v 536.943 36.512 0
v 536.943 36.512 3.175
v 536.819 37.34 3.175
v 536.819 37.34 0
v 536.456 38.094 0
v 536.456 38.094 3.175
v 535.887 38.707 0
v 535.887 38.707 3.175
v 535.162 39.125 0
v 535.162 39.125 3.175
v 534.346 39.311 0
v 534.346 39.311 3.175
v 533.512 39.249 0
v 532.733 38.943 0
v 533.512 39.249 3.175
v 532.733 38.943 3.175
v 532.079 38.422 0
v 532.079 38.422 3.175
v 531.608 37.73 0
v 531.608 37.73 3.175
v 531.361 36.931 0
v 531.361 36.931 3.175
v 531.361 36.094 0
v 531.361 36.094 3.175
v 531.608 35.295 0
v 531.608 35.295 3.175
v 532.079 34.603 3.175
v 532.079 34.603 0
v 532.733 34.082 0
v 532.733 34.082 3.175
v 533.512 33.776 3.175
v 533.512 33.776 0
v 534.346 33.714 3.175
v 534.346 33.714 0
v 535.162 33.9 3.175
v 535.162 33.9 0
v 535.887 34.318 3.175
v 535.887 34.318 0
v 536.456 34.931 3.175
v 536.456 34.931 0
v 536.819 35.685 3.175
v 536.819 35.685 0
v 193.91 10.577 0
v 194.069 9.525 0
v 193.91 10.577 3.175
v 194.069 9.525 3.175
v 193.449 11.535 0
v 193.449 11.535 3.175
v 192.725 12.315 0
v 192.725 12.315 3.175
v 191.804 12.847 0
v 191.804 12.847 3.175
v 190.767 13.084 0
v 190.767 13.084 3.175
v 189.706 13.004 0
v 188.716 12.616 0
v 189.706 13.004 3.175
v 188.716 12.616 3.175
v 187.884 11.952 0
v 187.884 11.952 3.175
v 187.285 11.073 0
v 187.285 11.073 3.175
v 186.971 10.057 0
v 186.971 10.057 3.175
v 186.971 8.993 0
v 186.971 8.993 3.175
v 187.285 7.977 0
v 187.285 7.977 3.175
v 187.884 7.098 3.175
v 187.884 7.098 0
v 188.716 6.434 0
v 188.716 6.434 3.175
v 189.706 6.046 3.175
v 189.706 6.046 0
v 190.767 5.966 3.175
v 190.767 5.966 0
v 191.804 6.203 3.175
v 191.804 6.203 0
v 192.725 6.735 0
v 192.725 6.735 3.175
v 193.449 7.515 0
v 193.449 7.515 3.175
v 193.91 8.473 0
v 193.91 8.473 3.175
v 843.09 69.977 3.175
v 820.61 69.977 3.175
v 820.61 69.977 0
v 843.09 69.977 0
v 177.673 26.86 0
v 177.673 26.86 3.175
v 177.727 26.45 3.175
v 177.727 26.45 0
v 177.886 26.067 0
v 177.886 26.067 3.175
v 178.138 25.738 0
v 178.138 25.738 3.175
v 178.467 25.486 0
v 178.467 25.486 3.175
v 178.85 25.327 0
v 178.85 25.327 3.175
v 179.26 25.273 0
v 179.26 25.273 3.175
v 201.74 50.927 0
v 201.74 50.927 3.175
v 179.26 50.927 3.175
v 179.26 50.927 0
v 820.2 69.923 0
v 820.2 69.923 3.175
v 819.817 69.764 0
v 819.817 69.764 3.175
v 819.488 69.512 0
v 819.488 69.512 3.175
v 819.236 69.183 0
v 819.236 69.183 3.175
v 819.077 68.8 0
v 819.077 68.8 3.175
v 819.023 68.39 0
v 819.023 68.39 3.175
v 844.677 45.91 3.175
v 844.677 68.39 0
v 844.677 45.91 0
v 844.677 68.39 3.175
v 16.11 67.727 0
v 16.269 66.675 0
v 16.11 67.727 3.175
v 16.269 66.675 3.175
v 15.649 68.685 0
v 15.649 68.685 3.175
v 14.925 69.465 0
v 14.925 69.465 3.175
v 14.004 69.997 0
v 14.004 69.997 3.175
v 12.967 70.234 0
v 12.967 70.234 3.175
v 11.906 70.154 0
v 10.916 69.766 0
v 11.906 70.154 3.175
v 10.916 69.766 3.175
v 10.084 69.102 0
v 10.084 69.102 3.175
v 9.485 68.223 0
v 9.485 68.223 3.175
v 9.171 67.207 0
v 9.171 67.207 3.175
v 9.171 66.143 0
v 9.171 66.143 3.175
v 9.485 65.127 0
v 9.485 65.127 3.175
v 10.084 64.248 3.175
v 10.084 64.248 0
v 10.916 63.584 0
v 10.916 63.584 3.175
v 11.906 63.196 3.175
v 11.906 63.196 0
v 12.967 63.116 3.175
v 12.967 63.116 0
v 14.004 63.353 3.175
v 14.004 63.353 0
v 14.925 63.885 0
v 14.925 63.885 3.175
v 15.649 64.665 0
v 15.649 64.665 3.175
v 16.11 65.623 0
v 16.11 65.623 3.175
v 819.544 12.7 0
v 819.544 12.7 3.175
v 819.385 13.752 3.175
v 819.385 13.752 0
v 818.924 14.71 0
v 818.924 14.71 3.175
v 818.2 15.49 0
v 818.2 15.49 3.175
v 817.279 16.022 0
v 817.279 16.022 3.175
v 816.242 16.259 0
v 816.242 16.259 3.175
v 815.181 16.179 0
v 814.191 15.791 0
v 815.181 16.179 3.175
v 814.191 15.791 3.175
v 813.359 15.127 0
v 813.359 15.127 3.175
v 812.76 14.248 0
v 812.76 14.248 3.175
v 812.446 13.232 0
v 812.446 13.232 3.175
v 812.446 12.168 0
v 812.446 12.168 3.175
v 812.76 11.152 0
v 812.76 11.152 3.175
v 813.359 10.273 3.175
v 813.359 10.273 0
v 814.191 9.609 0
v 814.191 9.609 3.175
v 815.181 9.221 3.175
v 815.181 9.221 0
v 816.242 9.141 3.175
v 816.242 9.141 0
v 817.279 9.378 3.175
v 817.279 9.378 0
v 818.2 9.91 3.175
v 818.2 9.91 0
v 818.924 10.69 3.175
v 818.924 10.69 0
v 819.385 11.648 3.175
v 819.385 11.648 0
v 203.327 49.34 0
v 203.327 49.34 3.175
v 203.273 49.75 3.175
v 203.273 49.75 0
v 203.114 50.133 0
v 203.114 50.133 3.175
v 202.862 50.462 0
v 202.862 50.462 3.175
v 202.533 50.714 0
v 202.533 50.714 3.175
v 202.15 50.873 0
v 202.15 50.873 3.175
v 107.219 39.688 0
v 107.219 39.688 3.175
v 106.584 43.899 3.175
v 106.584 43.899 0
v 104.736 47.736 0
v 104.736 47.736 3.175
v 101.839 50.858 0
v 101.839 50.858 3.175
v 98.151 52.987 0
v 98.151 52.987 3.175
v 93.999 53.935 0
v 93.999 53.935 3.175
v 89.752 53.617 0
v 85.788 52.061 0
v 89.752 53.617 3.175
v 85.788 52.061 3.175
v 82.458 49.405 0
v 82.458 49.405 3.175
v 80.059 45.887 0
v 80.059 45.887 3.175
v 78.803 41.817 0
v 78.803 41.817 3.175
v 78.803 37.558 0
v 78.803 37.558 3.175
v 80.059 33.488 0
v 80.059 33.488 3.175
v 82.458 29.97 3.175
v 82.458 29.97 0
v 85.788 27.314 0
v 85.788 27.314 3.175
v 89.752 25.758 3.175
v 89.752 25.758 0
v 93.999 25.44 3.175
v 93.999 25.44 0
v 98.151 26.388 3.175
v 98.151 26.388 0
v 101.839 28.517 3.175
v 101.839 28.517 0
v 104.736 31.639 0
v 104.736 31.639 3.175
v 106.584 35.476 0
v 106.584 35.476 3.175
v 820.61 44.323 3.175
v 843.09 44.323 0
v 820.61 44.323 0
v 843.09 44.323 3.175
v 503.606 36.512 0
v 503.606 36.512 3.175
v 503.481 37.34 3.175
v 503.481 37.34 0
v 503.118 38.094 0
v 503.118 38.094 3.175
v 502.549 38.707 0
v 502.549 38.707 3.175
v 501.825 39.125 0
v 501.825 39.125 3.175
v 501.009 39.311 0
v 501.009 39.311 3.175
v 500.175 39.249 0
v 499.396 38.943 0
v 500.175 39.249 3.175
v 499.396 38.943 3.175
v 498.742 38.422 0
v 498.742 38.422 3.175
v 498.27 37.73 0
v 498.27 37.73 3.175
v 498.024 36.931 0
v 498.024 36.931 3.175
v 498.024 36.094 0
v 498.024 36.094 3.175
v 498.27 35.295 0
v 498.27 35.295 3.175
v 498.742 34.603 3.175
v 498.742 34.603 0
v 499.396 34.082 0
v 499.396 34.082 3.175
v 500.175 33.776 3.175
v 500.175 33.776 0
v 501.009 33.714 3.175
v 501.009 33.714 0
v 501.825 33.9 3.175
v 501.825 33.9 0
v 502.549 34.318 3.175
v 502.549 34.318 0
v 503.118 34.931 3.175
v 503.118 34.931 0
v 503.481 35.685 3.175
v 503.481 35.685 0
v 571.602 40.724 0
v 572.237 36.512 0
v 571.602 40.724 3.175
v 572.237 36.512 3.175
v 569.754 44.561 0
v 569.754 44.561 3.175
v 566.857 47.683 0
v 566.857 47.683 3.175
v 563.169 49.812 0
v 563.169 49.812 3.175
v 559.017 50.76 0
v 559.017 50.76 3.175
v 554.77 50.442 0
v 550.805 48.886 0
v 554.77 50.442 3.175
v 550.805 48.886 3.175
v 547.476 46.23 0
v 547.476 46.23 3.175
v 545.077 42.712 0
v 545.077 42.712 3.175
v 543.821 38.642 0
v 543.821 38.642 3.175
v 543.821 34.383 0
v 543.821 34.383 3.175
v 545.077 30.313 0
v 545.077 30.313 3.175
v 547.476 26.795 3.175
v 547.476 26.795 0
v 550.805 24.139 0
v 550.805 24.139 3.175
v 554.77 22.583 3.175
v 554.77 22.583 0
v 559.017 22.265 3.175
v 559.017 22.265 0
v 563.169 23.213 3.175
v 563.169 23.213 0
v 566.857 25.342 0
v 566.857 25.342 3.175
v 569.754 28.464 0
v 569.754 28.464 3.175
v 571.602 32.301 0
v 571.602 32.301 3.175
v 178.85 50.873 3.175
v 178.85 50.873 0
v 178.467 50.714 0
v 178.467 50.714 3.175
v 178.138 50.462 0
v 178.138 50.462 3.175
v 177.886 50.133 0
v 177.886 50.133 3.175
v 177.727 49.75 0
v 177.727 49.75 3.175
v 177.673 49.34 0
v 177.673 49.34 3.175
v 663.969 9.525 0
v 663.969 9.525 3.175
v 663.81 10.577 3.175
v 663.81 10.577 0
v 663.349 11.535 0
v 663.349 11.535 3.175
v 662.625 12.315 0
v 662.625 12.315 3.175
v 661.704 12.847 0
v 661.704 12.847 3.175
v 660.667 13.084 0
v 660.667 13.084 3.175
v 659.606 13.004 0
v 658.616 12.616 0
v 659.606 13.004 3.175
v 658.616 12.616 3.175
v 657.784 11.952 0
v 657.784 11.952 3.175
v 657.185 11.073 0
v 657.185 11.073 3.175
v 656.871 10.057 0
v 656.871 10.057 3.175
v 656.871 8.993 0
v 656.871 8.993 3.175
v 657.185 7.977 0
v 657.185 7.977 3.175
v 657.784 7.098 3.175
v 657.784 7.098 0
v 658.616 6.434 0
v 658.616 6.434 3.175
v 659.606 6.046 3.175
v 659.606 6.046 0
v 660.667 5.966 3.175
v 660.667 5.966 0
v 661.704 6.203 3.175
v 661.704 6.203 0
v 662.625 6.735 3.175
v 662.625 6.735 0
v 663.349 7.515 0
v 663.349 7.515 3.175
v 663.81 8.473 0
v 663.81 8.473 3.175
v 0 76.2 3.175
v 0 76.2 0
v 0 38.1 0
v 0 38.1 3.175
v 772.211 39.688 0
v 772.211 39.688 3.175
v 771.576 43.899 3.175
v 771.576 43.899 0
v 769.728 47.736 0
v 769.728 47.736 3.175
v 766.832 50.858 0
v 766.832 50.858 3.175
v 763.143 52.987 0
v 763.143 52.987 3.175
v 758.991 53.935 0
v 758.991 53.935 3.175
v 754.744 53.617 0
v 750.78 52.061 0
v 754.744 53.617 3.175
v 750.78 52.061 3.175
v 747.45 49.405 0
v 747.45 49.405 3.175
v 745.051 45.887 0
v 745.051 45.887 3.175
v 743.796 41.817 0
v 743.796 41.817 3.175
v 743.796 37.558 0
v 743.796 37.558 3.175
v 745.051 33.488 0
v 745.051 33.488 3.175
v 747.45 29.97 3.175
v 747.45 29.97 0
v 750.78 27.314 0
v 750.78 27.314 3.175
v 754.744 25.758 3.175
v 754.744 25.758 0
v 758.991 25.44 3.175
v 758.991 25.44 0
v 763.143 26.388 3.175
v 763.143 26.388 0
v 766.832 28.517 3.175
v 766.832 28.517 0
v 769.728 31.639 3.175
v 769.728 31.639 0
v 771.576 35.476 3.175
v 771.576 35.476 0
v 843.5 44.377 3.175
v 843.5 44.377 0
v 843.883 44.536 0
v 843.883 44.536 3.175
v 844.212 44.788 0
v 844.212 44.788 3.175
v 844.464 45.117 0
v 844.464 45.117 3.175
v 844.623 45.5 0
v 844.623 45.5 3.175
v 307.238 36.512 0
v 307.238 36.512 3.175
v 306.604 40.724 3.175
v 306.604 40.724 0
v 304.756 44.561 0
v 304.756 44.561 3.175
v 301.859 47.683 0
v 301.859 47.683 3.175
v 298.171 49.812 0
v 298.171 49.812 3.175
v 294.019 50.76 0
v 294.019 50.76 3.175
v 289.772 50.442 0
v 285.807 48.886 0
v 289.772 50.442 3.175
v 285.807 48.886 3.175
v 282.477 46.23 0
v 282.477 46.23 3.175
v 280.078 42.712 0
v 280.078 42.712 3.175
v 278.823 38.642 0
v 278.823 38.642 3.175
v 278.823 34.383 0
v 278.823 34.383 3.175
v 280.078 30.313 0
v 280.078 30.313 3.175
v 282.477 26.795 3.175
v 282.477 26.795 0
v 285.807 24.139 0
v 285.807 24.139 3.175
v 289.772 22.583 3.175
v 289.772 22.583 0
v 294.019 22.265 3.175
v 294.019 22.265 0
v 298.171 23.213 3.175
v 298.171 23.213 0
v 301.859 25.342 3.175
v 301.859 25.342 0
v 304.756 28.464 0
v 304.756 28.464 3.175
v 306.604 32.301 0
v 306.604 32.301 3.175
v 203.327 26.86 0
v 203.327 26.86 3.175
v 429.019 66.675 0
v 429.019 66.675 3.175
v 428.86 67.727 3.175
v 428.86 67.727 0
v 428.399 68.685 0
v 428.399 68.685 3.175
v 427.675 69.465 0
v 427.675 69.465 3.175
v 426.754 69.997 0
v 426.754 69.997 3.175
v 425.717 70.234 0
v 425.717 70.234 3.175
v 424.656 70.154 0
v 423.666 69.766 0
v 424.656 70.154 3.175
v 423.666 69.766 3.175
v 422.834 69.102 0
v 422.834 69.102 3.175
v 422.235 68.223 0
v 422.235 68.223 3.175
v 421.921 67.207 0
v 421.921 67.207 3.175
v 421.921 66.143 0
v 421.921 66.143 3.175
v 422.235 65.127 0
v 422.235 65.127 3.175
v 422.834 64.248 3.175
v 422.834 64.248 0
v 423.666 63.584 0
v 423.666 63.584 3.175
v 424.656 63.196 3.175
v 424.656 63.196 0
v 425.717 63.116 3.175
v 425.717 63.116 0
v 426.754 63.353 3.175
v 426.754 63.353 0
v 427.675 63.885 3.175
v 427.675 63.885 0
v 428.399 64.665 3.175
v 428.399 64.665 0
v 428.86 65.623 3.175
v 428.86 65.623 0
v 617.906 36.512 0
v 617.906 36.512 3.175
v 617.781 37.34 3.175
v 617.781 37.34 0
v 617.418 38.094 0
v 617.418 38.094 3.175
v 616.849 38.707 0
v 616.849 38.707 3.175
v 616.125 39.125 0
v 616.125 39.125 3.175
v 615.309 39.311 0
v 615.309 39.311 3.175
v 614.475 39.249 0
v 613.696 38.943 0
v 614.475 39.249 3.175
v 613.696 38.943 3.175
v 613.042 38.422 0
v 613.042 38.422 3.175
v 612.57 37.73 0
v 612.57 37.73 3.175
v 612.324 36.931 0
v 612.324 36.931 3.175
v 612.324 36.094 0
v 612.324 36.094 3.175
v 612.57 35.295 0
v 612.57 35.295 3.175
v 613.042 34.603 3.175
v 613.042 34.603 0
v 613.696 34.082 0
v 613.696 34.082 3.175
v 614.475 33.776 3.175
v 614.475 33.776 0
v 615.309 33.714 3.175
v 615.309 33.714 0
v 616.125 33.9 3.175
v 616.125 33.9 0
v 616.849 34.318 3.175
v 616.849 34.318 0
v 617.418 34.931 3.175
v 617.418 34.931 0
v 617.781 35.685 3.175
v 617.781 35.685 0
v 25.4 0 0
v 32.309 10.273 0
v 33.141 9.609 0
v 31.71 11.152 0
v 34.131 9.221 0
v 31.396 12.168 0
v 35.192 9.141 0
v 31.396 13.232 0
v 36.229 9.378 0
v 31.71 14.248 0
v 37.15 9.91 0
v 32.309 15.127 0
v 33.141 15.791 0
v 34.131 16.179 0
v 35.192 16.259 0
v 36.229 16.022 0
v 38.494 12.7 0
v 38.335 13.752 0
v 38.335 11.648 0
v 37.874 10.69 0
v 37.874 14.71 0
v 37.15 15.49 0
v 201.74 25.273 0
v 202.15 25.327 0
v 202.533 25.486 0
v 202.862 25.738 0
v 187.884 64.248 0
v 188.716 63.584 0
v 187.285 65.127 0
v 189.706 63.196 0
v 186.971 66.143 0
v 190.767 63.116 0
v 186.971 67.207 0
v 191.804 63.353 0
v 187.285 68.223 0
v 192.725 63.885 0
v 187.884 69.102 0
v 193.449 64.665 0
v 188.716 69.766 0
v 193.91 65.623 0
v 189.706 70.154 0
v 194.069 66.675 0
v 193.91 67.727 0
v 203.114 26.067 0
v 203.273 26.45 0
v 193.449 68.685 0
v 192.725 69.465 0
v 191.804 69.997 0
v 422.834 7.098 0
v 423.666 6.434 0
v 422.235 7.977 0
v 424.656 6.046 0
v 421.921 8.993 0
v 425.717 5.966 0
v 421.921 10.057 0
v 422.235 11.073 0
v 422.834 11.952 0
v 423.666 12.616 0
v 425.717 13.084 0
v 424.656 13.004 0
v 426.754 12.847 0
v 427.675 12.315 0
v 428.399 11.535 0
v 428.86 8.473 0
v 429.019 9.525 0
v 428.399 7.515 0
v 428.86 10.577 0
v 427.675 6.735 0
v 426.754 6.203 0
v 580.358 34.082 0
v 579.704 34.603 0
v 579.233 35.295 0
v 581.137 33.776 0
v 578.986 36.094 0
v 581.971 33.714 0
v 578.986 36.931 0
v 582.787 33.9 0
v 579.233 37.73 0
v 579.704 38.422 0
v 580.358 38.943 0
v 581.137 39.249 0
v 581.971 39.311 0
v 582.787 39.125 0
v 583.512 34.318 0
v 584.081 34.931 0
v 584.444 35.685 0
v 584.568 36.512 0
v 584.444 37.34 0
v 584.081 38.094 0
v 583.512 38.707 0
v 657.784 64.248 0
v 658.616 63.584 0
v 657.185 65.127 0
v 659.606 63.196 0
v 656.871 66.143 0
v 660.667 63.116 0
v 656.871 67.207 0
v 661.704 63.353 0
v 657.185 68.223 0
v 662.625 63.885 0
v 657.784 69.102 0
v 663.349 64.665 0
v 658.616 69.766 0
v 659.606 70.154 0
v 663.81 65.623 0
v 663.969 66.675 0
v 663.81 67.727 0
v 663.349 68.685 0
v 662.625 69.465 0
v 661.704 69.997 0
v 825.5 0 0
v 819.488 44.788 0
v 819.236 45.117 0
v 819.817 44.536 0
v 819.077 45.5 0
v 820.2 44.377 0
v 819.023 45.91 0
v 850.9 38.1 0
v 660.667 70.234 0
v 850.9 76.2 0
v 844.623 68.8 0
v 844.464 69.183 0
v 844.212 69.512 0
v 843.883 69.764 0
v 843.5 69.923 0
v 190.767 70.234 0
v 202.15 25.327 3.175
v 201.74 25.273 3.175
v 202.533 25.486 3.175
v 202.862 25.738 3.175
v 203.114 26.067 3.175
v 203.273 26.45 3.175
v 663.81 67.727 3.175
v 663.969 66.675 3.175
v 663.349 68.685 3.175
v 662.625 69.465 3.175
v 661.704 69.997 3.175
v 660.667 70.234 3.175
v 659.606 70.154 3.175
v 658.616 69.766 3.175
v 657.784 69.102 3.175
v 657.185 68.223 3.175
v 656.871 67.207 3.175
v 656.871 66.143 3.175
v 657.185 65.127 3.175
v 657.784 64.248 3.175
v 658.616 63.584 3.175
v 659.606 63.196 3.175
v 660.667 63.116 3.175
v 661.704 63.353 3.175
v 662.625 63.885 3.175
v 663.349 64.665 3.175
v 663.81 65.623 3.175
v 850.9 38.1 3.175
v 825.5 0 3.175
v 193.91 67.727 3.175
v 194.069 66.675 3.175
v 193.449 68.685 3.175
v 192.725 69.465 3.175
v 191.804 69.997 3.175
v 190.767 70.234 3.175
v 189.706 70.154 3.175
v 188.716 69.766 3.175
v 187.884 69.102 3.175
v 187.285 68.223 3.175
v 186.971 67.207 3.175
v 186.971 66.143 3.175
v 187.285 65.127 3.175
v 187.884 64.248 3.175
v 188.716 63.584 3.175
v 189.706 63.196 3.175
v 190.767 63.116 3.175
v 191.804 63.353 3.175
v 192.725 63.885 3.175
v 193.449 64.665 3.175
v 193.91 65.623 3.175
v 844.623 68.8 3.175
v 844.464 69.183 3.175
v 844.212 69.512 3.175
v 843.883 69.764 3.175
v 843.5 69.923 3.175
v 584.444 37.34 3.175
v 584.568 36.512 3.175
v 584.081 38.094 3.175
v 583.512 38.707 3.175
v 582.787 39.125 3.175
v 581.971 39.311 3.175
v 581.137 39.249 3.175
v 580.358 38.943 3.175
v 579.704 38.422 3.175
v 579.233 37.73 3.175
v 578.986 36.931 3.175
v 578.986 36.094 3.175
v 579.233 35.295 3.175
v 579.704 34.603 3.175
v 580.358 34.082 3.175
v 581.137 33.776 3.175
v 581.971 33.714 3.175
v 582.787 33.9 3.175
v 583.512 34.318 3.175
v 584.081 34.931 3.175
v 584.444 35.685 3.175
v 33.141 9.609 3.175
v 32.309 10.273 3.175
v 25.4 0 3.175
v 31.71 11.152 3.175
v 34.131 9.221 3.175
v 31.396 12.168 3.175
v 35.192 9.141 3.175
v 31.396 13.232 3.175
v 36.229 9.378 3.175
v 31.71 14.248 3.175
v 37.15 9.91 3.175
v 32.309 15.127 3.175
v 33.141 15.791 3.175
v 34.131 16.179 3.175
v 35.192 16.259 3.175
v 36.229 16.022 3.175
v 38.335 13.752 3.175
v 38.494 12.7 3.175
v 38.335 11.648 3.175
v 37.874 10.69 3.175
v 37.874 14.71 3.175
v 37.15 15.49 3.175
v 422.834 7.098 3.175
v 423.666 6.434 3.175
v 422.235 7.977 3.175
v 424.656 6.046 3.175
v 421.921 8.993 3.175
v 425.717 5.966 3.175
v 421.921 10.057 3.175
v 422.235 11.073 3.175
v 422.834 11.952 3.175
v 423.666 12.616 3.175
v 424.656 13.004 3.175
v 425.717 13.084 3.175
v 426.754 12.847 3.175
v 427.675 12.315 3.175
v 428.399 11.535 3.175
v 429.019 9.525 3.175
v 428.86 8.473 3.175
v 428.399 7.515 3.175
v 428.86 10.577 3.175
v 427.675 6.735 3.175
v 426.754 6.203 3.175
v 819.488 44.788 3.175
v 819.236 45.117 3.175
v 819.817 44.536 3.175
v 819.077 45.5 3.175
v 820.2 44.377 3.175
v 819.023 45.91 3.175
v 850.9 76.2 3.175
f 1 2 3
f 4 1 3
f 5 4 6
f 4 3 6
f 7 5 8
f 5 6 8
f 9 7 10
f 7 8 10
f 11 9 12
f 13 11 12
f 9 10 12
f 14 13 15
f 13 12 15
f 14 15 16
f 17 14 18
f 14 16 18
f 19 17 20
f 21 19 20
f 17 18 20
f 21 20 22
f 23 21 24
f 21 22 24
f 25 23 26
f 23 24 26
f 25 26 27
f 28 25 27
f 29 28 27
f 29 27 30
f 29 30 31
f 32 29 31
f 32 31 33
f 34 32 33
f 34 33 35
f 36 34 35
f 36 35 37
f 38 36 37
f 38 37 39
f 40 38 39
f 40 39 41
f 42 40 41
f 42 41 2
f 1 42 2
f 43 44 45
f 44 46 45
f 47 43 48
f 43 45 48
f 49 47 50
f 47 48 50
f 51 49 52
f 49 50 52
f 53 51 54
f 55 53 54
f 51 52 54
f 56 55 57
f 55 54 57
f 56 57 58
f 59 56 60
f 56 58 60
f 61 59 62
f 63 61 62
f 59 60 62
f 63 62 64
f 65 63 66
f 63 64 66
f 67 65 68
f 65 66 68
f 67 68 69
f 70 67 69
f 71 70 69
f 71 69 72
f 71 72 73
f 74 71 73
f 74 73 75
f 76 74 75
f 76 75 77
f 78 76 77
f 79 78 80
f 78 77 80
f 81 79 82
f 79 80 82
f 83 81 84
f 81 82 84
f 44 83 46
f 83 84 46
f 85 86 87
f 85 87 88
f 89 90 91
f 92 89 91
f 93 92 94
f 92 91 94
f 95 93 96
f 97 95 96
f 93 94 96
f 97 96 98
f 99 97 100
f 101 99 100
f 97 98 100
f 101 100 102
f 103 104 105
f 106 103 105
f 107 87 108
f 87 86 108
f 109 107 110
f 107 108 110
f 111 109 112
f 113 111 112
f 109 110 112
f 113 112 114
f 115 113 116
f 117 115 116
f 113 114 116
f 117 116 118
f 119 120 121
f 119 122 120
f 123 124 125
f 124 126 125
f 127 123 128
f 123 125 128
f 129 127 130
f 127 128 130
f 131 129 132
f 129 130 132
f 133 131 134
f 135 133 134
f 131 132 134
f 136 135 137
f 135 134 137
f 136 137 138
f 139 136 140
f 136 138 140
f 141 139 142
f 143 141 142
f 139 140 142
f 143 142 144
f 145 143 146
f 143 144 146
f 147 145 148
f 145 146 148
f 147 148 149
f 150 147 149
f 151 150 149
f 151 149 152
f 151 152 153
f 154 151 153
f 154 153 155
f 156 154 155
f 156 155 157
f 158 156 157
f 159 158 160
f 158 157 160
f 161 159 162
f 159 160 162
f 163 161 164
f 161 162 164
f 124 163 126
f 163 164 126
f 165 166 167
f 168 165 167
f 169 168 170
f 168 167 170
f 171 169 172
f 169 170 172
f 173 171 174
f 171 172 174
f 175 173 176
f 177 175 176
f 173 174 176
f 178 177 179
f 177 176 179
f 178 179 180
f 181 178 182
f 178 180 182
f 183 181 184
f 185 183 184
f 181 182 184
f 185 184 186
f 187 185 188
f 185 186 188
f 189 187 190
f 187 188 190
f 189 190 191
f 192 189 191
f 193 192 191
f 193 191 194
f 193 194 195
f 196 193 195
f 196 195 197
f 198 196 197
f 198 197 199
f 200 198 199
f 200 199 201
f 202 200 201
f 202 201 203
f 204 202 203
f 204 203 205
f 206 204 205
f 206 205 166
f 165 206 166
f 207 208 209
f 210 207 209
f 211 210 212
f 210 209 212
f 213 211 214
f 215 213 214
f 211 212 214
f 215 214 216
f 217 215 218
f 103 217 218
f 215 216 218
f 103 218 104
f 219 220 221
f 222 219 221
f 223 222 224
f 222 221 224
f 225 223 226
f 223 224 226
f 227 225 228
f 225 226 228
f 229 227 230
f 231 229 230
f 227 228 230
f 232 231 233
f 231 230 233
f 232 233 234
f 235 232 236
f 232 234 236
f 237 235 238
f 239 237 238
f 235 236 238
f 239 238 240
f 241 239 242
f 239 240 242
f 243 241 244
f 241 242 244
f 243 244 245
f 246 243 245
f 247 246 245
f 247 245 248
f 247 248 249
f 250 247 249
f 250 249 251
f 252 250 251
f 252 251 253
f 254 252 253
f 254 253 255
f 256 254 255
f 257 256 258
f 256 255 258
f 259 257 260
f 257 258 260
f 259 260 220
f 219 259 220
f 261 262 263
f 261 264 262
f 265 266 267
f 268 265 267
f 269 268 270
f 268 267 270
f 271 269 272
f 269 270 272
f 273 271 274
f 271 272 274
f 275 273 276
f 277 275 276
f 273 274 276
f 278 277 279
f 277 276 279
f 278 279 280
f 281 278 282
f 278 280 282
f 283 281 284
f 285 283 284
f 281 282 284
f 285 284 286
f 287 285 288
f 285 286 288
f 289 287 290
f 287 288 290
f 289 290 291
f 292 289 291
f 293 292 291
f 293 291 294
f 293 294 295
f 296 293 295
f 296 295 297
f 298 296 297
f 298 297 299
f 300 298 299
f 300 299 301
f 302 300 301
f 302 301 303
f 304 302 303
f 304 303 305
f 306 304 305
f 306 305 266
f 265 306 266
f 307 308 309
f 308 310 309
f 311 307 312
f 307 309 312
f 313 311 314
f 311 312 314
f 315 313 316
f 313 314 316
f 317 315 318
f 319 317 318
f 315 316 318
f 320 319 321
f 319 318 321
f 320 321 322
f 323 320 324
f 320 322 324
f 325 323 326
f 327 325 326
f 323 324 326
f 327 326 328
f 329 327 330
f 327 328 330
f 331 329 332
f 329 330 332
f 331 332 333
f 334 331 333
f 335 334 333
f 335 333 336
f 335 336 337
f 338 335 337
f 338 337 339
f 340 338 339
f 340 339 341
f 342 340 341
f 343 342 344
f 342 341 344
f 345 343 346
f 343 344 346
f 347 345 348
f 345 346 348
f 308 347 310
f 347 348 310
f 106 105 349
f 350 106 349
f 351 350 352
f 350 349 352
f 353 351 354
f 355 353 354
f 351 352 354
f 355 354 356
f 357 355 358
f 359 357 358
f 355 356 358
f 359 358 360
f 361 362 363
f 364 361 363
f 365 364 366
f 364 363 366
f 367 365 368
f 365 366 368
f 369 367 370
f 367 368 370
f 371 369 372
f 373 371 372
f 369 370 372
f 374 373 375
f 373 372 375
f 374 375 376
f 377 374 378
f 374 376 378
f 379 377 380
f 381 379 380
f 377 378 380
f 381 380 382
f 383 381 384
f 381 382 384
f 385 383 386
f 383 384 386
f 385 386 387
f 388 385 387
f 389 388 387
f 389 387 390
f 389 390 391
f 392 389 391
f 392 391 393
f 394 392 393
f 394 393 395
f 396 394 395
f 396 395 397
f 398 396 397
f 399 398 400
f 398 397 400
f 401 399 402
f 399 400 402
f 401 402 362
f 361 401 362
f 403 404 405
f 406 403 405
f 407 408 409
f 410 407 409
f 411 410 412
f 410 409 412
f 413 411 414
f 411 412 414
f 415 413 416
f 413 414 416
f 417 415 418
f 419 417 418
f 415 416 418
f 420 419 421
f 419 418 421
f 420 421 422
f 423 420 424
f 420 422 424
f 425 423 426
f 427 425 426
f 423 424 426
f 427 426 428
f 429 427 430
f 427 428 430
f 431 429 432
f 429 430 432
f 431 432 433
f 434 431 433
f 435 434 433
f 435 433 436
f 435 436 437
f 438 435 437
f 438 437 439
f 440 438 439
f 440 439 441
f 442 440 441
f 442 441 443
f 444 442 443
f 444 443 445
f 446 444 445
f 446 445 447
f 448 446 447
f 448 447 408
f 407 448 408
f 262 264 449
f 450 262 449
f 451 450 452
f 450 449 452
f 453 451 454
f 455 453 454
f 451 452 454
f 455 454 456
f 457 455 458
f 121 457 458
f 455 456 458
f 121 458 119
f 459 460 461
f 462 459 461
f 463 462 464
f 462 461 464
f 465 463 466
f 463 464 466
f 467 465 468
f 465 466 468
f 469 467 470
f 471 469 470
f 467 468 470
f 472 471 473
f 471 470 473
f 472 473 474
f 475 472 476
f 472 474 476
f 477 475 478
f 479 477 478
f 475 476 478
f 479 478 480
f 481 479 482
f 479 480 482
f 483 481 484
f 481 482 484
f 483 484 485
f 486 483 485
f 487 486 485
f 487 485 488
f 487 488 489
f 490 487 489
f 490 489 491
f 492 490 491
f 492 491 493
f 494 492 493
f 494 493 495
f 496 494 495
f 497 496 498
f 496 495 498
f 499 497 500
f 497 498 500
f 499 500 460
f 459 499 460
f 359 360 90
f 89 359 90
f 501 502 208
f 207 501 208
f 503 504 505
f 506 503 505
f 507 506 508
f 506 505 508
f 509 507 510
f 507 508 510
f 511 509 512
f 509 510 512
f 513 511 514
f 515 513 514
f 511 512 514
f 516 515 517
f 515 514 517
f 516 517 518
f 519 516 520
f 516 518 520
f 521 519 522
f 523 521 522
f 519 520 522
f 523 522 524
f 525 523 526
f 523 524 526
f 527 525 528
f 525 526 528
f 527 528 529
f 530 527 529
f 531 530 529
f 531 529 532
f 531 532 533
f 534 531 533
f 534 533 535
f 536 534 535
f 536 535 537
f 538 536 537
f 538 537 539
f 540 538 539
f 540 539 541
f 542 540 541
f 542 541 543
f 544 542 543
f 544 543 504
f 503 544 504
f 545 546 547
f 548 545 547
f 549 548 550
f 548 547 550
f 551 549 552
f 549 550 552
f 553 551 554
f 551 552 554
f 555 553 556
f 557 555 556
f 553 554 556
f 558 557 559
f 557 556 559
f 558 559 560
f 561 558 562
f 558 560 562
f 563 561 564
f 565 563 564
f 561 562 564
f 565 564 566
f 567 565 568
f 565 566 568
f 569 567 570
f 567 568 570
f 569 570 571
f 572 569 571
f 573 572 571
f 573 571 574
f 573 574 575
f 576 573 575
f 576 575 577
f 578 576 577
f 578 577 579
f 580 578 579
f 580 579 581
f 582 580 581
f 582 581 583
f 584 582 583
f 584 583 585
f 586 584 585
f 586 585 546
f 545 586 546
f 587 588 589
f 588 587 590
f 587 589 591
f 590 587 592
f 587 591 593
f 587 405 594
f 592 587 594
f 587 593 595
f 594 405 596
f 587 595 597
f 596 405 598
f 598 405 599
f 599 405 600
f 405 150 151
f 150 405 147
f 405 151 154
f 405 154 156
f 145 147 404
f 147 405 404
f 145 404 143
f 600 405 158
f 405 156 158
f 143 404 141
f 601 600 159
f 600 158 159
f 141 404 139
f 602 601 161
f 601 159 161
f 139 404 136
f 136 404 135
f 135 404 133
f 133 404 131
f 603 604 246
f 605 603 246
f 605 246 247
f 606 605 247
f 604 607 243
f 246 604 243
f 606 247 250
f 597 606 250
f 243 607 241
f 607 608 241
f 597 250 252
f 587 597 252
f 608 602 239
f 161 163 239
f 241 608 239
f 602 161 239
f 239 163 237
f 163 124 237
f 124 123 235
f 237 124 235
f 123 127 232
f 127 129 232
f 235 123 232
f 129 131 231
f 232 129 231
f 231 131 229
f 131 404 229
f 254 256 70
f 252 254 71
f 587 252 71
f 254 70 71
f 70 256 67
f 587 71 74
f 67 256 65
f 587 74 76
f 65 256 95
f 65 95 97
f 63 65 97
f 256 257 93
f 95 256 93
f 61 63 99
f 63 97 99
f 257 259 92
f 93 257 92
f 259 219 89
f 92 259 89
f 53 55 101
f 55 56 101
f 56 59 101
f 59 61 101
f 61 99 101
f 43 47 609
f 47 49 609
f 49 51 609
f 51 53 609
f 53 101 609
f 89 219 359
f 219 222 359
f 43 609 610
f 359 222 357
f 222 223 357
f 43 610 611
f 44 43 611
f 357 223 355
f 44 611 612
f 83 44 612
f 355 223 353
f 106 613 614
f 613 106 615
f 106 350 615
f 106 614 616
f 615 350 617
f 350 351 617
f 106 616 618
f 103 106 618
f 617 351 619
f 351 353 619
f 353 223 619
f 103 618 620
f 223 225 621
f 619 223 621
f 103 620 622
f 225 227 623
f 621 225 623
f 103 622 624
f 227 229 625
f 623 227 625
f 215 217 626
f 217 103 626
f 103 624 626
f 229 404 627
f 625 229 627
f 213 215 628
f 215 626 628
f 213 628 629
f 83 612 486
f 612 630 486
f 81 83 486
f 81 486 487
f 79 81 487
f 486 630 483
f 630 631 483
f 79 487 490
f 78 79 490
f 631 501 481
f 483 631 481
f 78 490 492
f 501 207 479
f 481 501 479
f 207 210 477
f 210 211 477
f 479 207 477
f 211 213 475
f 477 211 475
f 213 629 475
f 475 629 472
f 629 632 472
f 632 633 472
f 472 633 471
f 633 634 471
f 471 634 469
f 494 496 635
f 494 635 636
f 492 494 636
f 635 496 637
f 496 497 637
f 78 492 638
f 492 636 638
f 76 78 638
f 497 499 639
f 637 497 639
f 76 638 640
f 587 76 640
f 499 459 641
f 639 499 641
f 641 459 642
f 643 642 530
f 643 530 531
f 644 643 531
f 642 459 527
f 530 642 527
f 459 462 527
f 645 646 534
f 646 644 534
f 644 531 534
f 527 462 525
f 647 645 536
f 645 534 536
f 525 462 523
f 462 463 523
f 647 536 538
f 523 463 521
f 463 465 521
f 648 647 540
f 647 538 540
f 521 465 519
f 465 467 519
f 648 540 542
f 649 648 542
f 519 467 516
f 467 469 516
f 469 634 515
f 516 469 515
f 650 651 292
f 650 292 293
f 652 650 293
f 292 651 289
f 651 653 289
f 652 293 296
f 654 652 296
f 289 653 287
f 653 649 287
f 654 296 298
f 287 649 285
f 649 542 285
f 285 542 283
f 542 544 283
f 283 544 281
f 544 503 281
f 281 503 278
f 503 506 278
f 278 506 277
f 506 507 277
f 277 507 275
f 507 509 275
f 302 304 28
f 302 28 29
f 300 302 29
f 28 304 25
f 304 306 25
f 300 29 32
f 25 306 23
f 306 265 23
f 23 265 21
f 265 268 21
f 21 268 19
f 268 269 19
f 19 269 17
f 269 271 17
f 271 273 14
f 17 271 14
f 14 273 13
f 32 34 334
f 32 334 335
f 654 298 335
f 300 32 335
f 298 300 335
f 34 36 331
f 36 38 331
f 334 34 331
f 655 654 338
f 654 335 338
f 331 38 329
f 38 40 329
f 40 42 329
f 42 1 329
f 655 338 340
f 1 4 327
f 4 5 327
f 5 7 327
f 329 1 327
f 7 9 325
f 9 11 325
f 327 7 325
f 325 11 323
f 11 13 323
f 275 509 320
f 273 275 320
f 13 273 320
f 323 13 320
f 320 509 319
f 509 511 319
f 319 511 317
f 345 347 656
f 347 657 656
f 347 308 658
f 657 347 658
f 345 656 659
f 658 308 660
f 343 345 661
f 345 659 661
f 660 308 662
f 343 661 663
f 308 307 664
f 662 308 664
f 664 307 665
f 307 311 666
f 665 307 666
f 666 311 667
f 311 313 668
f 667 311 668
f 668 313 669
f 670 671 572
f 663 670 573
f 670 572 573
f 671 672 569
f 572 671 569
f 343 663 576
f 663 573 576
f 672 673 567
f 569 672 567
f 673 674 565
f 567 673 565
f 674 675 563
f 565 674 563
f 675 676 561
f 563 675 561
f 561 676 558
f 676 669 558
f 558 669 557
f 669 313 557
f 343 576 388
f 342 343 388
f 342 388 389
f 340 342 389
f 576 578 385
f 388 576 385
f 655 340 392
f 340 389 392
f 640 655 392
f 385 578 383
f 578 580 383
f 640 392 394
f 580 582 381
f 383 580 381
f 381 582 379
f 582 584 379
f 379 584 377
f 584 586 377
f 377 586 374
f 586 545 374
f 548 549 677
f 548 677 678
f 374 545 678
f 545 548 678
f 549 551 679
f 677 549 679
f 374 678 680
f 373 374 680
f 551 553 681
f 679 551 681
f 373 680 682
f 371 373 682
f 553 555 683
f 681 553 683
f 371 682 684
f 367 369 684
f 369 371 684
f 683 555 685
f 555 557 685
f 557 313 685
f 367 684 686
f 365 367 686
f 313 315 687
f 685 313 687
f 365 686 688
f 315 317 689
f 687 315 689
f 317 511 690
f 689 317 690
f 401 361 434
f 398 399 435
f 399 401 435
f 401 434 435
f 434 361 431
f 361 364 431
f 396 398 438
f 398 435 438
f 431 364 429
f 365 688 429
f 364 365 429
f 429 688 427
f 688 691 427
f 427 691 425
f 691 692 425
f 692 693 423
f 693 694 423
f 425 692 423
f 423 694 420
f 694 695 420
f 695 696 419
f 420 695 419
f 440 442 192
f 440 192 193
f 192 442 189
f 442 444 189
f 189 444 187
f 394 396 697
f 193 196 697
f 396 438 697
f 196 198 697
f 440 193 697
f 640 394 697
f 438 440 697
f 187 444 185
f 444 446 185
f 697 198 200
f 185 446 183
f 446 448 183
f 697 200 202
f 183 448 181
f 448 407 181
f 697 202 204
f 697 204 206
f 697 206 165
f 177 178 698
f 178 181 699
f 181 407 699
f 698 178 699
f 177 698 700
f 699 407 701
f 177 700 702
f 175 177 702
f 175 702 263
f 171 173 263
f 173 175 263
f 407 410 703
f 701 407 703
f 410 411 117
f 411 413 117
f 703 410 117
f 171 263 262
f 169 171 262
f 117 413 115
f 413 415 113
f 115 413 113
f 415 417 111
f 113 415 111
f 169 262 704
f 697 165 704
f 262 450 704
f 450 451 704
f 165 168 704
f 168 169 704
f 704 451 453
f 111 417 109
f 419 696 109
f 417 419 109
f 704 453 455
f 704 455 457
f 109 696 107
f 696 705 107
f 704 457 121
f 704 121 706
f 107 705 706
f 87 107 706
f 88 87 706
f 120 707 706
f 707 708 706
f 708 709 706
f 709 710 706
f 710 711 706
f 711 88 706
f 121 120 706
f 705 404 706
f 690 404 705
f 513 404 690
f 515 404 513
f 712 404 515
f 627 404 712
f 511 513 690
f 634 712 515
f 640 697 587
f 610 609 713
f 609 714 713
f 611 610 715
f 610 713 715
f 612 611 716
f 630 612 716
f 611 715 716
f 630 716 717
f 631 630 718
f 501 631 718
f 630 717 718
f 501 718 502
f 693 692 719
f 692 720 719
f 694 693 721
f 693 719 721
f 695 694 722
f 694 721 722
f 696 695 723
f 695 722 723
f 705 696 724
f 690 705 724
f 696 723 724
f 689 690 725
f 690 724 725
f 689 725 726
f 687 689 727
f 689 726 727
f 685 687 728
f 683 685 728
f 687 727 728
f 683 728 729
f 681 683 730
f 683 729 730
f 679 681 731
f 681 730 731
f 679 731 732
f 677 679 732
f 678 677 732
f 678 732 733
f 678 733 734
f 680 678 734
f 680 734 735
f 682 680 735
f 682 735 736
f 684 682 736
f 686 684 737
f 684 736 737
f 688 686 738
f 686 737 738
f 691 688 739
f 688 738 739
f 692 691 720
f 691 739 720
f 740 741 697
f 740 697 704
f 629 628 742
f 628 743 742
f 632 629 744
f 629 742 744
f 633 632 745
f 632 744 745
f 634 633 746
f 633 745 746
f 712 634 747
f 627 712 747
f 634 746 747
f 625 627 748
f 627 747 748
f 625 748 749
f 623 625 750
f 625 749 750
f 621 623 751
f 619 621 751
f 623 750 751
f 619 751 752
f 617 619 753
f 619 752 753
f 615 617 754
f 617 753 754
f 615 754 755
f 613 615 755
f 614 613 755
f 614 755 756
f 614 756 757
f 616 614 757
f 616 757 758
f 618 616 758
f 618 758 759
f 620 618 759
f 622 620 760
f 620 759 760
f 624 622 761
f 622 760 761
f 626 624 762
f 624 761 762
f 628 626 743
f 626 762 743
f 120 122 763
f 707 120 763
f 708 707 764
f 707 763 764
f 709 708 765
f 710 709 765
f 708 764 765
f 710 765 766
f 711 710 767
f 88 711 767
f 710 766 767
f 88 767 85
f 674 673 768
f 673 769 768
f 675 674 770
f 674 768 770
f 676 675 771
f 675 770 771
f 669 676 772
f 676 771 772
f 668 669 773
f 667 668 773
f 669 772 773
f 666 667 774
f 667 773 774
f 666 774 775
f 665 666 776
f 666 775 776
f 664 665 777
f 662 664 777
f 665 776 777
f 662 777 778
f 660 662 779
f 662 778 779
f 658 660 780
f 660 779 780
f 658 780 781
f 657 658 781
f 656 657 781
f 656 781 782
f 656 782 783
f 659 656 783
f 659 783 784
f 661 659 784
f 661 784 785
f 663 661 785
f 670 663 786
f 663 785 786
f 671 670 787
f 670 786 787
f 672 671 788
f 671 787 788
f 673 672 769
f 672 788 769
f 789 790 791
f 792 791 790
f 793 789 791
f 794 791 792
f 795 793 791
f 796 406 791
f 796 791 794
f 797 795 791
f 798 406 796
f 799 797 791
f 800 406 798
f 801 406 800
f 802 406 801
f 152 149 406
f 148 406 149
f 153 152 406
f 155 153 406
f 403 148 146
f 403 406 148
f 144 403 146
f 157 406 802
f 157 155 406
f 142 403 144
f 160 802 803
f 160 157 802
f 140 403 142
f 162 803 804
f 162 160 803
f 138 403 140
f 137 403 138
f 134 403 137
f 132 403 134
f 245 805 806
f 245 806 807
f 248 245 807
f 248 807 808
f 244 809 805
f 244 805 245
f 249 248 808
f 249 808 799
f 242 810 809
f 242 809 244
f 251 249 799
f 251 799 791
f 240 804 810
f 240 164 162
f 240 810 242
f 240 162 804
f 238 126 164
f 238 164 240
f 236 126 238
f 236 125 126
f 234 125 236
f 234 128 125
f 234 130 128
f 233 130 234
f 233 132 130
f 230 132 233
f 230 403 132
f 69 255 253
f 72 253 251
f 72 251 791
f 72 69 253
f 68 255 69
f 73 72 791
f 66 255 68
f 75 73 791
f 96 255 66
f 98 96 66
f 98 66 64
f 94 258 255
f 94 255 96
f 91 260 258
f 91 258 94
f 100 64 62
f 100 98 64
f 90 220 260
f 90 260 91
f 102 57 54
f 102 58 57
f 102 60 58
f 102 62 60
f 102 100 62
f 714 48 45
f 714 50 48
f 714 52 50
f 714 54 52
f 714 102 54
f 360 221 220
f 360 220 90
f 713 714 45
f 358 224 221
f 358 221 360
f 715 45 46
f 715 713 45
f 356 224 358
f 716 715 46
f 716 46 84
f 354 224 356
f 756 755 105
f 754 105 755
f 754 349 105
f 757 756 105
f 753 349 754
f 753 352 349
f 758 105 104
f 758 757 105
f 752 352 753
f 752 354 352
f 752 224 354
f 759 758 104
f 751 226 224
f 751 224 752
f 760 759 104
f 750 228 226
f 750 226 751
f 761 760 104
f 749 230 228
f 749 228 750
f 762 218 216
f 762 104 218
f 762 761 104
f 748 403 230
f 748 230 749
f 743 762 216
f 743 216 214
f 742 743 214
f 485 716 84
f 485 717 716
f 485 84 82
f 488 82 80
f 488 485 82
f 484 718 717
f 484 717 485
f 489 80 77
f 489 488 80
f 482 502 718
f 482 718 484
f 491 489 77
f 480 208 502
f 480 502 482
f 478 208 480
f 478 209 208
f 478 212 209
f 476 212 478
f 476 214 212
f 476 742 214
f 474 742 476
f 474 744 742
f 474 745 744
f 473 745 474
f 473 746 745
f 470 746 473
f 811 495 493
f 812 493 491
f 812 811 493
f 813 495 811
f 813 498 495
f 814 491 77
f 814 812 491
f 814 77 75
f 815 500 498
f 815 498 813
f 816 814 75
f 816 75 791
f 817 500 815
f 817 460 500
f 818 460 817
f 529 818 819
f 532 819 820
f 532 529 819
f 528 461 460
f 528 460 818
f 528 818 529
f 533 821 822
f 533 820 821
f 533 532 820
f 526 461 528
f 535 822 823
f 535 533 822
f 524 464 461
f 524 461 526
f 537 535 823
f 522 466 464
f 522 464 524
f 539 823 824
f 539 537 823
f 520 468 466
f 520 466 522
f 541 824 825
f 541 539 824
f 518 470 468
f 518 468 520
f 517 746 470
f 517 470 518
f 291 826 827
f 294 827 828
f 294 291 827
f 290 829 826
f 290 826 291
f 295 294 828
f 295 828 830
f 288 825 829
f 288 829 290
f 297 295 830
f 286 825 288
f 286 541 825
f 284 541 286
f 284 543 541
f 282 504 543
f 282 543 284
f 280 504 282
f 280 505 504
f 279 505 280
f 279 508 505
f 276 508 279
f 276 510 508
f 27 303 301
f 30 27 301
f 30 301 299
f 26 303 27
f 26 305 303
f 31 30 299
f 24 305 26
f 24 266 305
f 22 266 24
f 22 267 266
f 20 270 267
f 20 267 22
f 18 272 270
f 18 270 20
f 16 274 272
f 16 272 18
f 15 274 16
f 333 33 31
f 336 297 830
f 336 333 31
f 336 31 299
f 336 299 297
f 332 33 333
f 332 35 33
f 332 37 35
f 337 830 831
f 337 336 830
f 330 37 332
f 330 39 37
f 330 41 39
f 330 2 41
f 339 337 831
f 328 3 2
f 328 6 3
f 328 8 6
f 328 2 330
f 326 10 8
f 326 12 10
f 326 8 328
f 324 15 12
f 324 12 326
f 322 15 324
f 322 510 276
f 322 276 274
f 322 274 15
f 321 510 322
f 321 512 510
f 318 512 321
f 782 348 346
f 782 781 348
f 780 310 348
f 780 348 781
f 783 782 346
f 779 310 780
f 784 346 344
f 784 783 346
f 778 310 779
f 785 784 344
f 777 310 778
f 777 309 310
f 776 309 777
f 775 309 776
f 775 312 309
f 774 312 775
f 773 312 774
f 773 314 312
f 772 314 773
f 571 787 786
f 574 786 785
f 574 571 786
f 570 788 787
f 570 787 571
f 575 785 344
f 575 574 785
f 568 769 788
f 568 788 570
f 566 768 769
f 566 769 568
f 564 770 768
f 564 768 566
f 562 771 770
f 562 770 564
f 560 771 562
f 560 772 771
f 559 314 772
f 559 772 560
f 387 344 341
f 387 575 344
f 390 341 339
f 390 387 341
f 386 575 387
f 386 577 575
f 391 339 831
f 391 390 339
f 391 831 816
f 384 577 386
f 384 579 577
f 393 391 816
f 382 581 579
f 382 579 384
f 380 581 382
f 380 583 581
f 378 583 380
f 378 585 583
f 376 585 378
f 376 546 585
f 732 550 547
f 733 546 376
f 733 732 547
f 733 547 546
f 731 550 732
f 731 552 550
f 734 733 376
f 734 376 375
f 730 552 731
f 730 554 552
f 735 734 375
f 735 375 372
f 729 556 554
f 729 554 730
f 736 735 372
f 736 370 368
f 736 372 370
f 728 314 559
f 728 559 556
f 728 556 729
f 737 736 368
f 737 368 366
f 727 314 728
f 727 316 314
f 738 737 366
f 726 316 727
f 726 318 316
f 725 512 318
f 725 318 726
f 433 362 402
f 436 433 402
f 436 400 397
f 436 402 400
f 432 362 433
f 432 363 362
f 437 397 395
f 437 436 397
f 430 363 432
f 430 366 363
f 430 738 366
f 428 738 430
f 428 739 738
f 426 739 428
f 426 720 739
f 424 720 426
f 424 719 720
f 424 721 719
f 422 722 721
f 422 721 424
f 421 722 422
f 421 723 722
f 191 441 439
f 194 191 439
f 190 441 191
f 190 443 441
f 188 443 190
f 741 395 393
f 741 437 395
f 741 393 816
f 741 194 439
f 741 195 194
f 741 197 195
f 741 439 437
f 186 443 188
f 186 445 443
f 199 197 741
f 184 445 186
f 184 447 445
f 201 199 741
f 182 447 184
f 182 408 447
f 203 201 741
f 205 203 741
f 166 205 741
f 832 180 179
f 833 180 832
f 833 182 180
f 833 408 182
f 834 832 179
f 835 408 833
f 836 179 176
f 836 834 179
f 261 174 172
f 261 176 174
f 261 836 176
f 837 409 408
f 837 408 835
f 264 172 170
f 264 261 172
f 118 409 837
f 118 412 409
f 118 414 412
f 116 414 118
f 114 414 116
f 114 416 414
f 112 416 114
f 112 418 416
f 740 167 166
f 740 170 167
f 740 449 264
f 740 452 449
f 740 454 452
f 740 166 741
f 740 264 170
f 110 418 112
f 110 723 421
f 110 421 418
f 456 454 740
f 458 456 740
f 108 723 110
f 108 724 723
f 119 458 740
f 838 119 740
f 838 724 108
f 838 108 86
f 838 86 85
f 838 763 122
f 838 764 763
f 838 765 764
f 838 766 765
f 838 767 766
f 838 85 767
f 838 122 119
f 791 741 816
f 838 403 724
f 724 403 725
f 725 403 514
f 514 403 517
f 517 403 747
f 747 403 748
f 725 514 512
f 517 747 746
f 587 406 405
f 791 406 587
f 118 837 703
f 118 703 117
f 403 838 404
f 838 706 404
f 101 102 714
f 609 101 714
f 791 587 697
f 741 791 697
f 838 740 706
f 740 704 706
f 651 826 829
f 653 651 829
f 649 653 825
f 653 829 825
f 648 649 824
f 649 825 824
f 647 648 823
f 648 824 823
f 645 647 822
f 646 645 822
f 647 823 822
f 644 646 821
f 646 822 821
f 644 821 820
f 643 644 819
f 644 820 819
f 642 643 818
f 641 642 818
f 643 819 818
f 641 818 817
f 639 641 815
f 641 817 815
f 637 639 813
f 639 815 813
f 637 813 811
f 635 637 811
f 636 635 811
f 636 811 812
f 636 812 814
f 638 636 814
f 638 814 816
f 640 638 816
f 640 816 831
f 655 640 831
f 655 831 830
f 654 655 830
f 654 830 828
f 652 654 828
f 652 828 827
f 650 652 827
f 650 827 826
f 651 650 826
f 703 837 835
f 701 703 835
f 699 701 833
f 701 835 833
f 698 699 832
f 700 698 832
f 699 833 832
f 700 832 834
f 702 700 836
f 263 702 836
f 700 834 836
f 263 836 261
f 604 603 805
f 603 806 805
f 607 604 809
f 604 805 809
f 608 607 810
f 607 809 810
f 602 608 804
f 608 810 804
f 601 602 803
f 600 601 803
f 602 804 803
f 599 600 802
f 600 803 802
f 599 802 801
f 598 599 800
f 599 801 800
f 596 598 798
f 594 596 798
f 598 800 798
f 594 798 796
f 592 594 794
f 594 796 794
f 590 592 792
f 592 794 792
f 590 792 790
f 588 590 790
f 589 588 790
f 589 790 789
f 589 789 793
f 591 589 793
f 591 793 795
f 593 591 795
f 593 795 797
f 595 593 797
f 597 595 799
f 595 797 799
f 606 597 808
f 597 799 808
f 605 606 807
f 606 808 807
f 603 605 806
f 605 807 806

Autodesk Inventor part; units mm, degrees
ref_plane "YZ Plane" through (0, 0, 0) normal (1, 0, 0) x (0, 1, 0)
ref_plane "XZ Plane" through (0, 0, 0) normal (0, 1, 0) x (-1, 0, 0)
ref_plane "XY Plane" through (0, 0, 0) normal (0, 0, 1) x (1, 0, 0)
sketch "Sketch1" plane through (0, 0, 0) normal (0, 0, 1) x (1, 0, 0)
  line L0 (0, 0) -> (850.9, 0)
  line L1 (850.9, 0) -> (850.9, 76.2)
  line L2 (850.9, 76.2) -> (0, 76.2)
  line L3 (0, 76.2) -> (0, 0)
  dimension "d0" = 850.9
  dimension "d1" = 76.2
extrude "Extrusion1" add sketch "Sketch1" along normal blind 3.175
sketch "Sketch2" plane through (0, 0, 3.175) normal (0, 0, 1) x (1, 0, 0)
  line L0 (0, 0) -> (850.9, 0) projected
  circle A0 centre (292.9509, 36.5125) radius 14.2875
  circle A1 centre (557.9491, 36.5125) radius 14.2875
  circle A2 centre (92.9313, 39.6875) radius 14.2875
  circle A3 centre (757.9235, 39.6875) radius 14.2875
  line L1 (0, 0) -> (25.4, 0)
  line L2 (0, 0) -> (0, 38.1)
  line L3 (0, 76.2) -> (0, 0) projected
  line L4 (0, 38.1) -> (25.4, 0)
  circle A4 centre (34.925, 12.7) radius 3.5687
  circle A5 centre (12.7, 66.675) radius 3.5687
  line L5 (850.9, 76.2) -> (0, 76.2) projected
  line L6 (850.9, 0) -> (850.9, 38.1)
  line L7 (850.9, 0) -> (850.9, 76.2) projected
  line L8 (850.9, 0) -> (825.5, 0)
  line L9 (825.5, 0) -> (850.9, 38.1)
  circle A6 centre (190.5, 38.1) radius 3.5687
  line L10 (825.5, 0) -> (800.1, 0)
  circle A7 centre (815.975, 12.7) radius 3.5687
  circle A8 centre (831.85, 57.15) radius 3.5687
  circle A9 centre (425.45, 66.675) radius 3.5687
  circle A10 centre (425.45, 9.525) radius 3.5687
  circle A11 centre (190.5, 9.525) radius 3.5687
  circle A12 centre (190.5, 66.675) radius 3.5687
  circle A13 centre (660.4, 66.675) radius 3.5687
  circle A14 centre (660.4, 9.525) radius 3.5687
  dimension "d10" = 28.575
  dimension "d23" = 28.575
  dimension "d30" = 28.575
  dimension "d32" = 28.575
  dimension "d34" = 25.4
  dimension "d35" = 38.1
  dimension "d36" = 7.1374
  dimension "d37" = 12.7
  dimension "d38" = 9.525
  dimension "d40" = 7.1374
  dimension "d41" = 12.7
  dimension "d42" = 9.525
  dimension "d43" = 38.1
  dimension "d44" = 25.4
  dimension "d53" = 7.1374
  dimension "d54" = 38.1
  dimension "d55" = 190.5
  dimension "d59" = 7.1374
  dimension "d60" = 12.7
  dimension "d61" = 9.525
  dimension "d66" = 7.1374
  dimension "d67" = 7.1374
  dimension "d68" = 9.525
  dimension "d69" = 425.45
  dimension "d70" = 7.1374
  dimension "d71" = 9.525
  dimension "d72" = 425.45
  dimension "d73" = 7.1374
  dimension "d74" = 7.1374
  dimension "d75" = 9.525
  dimension "d76" = 9.525
  dimension "d77" = 190.5
  dimension "d78" = 190.5
  dimension "d79" = 7.1374
  dimension "d80" = 7.1374
  dimension "d81" = 9.525
  dimension "d82" = 9.525
  dimension "d83" = 190.5
  dimension "d84" = 190.5
extrude "Extrusion2" cut sketch "Sketch2" against normal blind 3.175 contours L2 L4 L0 | L9 L6 L0 | A0 | A1 | A2 | A3 | A4 | A5 | A6 | A7 | A8 | A9 | A10 | A11 | A12 | A13 | A14
sketch "Sketch3" plane through (0, 0, 3.175) normal (0, 0, 1) x (1, 0, 0)
  circle A0 centre (190.5, 38.1) radius 3.5687 projected
  circle A1 centre (831.85, 57.15) radius 3.5687 projected
  line L0 (179.2605, 25.273) -> (201.7395, 25.273)
  line L1 (203.327, 26.8605) -> (203.327, 49.3395)
  line L2 (201.7395, 50.927) -> (179.2605, 50.927)
  line L3 (177.673, 49.3395) -> (177.673, 26.8605)
  line L4 (177.673, 25.273) -> (203.327, 50.927) construction
  line L5 (203.327, 25.273) -> (177.673, 50.927) construction
  line L6 (843.0895, 44.323) -> (820.6105, 44.323)
  line L7 (819.023, 45.9105) -> (819.023, 68.3895)
  line L8 (820.6105, 69.977) -> (843.0895, 69.977)
  line L9 (844.677, 68.3895) -> (844.677, 45.9105)
  line L10 (844.677, 44.323) -> (819.023, 69.977) construction
  line L11 (819.023, 44.323) -> (844.677, 69.977) construction
  circle A2 centre (581.7616, 36.5125) radius 2.8067
  circle A3 centre (534.1366, 36.5125) radius 2.8067
  circle A4 centre (500.7991, 36.5125) radius 2.8067
  circle A5 centre (615.0991, 36.5125) radius 2.8067
  arc A6 (179.2605, 50.927) -> (177.673, 49.3395) centre (179.2605, 49.3395) ccw
  arc A7 (203.327, 49.3395) -> (201.7395, 50.927) centre (201.7395, 49.3395) ccw
  arc A8 (201.7395, 25.273) -> (203.327, 26.8605) centre (201.7395, 26.8605) ccw
  arc A9 (177.673, 26.8605) -> (179.2605, 25.273) centre (179.2605, 26.8605) ccw
  arc A10 (820.6105, 69.977) -> (819.023, 68.3895) centre (820.6105, 68.3895) ccw
  arc A11 (844.677, 68.3895) -> (843.0895, 69.977) centre (843.0895, 68.3895) ccw
  arc A12 (843.0895, 44.323) -> (844.677, 45.9105) centre (843.0895, 45.9105) ccw
  arc A13 (819.023, 45.9105) -> (820.6105, 44.323) centre (820.6105, 45.9105) ccw
  point P0 (0, 0)
  dimension "d88" = 25.654
  dimension "d89" = 25.654
  dimension "d90" = 25.654
  dimension "d91" = 25.654
  dimension "d93" = 5.6134
  dimension "d94" = 5.6134
  dimension "d96" = 5.6134
  dimension "d97" = 5.6134
  dimension "d98" = 1.5875
extrude "Extrusion4" cut sketch "Sketch3" against normal blind 25.4
properties part number "InsidePlate" material "Aluminum 6061"
